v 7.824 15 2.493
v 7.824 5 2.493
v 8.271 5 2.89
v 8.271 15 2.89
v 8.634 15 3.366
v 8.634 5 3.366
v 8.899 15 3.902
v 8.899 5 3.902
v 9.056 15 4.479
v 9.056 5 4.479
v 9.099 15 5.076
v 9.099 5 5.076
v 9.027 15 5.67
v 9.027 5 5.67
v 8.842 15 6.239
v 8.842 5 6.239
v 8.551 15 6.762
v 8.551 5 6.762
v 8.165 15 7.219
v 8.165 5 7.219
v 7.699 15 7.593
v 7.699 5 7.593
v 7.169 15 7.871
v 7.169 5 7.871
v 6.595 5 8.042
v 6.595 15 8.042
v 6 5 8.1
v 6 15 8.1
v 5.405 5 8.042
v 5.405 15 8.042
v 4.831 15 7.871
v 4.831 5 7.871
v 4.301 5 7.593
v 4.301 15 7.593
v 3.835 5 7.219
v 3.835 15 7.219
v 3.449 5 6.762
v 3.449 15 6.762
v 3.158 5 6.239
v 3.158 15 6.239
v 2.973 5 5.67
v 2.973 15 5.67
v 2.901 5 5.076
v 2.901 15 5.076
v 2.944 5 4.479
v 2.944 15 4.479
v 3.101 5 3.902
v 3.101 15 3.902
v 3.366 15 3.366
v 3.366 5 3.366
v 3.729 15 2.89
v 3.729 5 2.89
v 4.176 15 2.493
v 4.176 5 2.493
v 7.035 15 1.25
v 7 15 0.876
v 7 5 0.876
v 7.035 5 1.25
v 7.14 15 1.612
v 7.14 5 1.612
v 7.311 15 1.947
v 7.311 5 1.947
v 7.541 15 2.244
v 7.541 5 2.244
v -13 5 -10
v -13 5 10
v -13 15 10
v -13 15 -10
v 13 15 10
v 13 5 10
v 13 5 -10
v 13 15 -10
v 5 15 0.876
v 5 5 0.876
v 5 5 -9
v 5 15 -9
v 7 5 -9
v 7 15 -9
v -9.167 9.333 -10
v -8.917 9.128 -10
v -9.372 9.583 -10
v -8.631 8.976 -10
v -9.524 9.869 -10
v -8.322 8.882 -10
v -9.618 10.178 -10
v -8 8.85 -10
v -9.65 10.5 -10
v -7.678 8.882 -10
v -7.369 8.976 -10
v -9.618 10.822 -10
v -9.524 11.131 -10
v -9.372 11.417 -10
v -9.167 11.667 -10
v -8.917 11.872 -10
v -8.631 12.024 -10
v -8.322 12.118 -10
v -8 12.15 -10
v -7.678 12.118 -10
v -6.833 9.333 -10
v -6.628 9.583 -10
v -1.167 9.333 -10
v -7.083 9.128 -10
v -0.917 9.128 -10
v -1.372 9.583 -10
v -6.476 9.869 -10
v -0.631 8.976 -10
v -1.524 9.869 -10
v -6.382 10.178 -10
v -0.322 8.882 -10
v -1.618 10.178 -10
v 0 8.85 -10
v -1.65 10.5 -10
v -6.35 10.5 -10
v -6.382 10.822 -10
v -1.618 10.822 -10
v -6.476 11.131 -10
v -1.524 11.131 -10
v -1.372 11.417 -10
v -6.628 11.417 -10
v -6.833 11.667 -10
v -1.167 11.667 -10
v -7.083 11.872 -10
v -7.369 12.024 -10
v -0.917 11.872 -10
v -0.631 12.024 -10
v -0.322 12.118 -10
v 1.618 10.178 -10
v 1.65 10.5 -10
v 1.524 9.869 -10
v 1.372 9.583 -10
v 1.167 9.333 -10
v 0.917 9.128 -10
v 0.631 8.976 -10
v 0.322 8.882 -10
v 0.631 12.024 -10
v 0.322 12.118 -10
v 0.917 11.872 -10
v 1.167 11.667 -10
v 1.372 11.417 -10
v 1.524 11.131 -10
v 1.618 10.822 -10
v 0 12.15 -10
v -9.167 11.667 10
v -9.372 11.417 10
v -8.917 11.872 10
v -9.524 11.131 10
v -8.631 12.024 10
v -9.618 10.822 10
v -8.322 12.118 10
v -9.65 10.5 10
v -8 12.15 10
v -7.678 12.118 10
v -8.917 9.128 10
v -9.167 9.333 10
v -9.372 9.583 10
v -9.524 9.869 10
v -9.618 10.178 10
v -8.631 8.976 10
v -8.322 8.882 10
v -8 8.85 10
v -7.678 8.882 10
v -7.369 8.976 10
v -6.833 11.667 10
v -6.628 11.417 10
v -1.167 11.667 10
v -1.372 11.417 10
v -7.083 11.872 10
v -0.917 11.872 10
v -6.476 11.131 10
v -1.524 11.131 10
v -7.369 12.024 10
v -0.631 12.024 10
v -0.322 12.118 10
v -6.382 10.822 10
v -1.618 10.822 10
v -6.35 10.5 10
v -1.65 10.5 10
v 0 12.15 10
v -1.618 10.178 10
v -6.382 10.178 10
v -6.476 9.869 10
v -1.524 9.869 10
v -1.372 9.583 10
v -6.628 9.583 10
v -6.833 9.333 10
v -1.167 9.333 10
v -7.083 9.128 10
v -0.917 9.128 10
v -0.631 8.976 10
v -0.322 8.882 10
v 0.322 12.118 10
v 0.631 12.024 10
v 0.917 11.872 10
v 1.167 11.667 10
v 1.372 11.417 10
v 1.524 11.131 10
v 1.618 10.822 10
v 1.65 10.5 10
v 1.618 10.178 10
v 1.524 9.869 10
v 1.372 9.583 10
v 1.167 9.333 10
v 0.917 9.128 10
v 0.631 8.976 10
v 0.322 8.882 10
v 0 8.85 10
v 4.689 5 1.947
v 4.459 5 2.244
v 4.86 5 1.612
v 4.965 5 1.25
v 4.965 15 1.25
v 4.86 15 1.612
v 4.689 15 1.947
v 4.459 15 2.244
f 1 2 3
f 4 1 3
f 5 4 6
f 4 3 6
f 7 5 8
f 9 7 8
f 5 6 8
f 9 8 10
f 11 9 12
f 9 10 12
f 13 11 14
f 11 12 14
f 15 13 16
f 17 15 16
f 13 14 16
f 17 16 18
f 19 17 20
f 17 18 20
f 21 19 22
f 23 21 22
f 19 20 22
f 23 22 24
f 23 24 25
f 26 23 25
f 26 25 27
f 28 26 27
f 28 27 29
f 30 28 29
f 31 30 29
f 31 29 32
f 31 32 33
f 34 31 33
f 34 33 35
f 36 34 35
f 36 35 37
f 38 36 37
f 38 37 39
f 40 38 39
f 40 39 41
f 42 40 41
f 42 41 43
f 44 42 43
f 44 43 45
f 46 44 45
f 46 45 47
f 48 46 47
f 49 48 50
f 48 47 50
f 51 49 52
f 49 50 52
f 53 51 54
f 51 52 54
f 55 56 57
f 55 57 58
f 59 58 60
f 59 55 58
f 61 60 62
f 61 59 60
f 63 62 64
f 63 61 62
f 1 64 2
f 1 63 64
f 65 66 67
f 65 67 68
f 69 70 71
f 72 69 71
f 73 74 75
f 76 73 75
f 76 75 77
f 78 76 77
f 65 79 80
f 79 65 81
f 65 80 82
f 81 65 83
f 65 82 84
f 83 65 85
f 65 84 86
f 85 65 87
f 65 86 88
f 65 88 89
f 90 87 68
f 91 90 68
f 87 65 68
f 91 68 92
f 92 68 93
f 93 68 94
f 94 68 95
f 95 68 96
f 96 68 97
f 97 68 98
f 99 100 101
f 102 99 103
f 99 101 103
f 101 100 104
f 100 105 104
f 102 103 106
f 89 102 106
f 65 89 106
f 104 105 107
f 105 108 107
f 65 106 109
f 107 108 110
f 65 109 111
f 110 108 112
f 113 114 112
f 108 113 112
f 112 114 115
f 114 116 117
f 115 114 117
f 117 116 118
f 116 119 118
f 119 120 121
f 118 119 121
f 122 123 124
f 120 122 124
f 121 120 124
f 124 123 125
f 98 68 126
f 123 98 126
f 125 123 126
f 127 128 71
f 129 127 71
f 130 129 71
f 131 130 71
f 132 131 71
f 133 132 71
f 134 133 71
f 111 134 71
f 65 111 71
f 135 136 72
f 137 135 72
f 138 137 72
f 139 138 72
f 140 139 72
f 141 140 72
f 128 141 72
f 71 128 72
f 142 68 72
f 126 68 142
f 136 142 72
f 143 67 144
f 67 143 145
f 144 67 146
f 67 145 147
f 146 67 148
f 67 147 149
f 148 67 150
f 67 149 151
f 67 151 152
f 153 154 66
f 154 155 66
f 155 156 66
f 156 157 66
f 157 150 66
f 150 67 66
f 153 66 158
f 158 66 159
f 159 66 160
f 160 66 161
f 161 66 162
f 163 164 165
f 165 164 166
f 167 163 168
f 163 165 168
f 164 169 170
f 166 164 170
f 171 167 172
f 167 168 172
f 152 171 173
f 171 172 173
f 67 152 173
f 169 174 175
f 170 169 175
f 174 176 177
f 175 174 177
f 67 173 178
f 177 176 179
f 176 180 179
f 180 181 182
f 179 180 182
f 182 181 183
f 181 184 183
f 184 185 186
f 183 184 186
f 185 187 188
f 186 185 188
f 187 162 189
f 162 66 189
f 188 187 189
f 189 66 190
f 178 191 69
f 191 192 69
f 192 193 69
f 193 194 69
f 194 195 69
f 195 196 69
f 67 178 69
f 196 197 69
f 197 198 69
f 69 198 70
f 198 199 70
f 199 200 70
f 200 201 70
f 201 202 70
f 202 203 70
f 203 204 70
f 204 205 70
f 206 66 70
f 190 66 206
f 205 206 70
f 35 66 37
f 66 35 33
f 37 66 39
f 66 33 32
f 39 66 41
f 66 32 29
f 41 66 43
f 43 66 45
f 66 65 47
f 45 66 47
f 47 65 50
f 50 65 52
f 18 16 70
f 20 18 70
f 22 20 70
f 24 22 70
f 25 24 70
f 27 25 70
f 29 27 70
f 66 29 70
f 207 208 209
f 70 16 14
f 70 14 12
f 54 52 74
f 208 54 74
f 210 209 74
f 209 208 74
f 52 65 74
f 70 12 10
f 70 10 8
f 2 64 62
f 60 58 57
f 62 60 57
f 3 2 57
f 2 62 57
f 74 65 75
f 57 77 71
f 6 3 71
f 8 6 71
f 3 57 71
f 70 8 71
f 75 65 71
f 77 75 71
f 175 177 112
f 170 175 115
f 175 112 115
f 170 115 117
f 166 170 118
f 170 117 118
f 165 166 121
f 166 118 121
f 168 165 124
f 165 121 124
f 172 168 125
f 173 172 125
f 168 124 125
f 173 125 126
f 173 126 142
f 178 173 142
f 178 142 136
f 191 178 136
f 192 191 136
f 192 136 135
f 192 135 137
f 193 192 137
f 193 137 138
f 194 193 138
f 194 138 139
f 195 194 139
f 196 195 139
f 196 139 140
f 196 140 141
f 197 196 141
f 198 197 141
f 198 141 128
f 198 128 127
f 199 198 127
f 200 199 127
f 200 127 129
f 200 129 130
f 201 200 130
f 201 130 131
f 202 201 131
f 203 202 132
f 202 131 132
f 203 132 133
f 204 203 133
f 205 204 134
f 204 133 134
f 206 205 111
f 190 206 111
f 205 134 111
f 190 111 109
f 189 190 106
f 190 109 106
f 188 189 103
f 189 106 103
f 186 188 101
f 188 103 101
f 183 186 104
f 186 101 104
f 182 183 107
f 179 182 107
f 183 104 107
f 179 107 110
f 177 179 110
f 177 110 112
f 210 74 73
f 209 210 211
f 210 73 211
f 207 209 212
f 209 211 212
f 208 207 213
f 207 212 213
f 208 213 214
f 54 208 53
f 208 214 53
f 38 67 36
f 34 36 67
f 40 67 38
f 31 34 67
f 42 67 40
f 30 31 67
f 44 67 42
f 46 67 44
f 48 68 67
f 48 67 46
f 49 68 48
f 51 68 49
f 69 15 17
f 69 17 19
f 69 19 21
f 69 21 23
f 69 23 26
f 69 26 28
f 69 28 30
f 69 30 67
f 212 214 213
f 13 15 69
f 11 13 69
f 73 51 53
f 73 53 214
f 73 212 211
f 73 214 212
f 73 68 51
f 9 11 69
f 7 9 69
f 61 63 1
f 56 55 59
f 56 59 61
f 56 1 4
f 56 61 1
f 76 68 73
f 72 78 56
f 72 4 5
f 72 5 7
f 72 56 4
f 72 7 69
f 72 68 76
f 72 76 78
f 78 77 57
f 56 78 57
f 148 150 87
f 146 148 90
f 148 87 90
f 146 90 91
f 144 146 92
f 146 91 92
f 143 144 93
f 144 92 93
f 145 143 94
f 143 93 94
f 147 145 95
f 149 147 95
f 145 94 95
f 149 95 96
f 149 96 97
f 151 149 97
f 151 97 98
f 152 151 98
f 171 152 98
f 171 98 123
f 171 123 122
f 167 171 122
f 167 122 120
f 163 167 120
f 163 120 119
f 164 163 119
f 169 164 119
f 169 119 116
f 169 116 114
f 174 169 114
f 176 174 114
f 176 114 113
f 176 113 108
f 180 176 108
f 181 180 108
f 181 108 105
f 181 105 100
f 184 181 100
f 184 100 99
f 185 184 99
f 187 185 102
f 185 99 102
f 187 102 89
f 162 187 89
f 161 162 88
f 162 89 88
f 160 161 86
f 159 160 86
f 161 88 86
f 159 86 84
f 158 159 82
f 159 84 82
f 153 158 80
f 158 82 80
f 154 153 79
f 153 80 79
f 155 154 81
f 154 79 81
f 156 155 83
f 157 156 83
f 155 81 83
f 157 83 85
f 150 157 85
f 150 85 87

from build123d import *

# Parameters (mm, degrees)
SKETCH_1_W          = 26
SKETCH_1_H          = 20
EXTRUDE_1_DEPTH     = 25
CUT_EXTRUDE_1_DEPTH = 16
FILLET_1_R          = 2
SKETCH_3_R          = 1.25
CUT_EXTRUDE_2_DEPTH = 23.912878475
SKETCH_4_R          = 1.65
CUT_EXTRUDE_3_DEPTH = 35.554305086
SKETCH_5_W          = 20
SKETCH_5_H          = 5
CUT_EXTRUDE_4_DEPTH = 38.429934544
SKETCH_6_W          = 26
SKETCH_6_H          = 10
CUT_EXTRUDE_5_DEPTH = 35.554305086
SKETCH_7_W          = 2
SKETCH_7_H          = 1
EXTRUDE_2_DEPTH     = 10


with BuildPart() as part:
    # 草图1 → 凸台-拉伸1 (new body)
    with BuildSketch(Plane(origin=(0, 0, 0), x_dir=(1, 0, 0), z_dir=(0, 1, 0))):
        Rectangle(SKETCH_1_W, SKETCH_1_H)
    extrude(amount=EXTRUDE_1_DEPTH)

    # 草图2 → 切除-拉伸1 (cut)
    with BuildSketch(Plane.XZ):
        with BuildLine():
            Line((5, 2.06571985), (5, -10))
            Line((5, -10), (7, -10))
            Line((7, -10), (7, 2.06571985))
            ThreePointArc((7, 2.06571985), (6, 8.1), (5, 2.06571985))
        make_face()
    extrude(amount=-CUT_EXTRUDE_1_DEPTH, mode=Mode.SUBTRACT)

    # 圆角1
    fillet_1_edges = [part.edges().sort_by_distance(p)[0] for p in [
        (5, 8, 2.06571985),
        (7, 8, 2.06571985),
    ]]
    fillet(fillet_1_edges, radius=FILLET_1_R)

    # 草图3 → 切除-拉伸2 (cut, through all)
    with BuildSketch(Plane.XZ.offset(-16)):
        with Locations(Location((6, 5, 0), (0, 0, 270))):
            Circle(SKETCH_3_R)
    extrude(amount=-CUT_EXTRUDE_2_DEPTH, mode=Mode.SUBTRACT)

    # 草图4 → 切除-拉伸3 (cut, through all)
    with BuildSketch(Plane(origin=(0, 0, -10), x_dir=(-1, 0, 0), z_dir=(0, 0, -1))):
        with Locations((8, 10.5)):
            Circle(SKETCH_4_R)
        with Locations((0, 10.5)):
            Circle(SKETCH_4_R)
    extrude(amount=-CUT_EXTRUDE_3_DEPTH, mode=Mode.SUBTRACT)

    # 草图5 → 切除-拉伸4 (cut, through all)
    with BuildSketch(Plane(origin=(13, 0, 0), x_dir=(0, 0, -1), z_dir=(1, 0, 0))):
        with Locations((0, 2.5)):
            Rectangle(SKETCH_5_W, SKETCH_5_H)
    extrude(amount=-CUT_EXTRUDE_4_DEPTH, mode=Mode.SUBTRACT)

    # 草图6 → 切除-拉伸5 (cut, through all)
    with BuildSketch(Plane(origin=(0, 0, -10), x_dir=(-1, 0, 0), z_dir=(0, 0, -1))):
        with Locations((0, 20)):
            Rectangle(SKETCH_6_W, SKETCH_6_H)
    extrude(amount=-CUT_EXTRUDE_5_DEPTH, mode=Mode.SUBTRACT)

    # 草图7 → 凸台-拉伸2 (add)
    with BuildSketch(Plane(origin=(0, 15, 0), x_dir=(1, 0, 0), z_dir=(0, 1, 0))):
        with Locations((6, 9.5)):
            Rectangle(SKETCH_7_W, SKETCH_7_H)
    extrude(amount=-EXTRUDE_2_DEPTH)


solid = part.part
